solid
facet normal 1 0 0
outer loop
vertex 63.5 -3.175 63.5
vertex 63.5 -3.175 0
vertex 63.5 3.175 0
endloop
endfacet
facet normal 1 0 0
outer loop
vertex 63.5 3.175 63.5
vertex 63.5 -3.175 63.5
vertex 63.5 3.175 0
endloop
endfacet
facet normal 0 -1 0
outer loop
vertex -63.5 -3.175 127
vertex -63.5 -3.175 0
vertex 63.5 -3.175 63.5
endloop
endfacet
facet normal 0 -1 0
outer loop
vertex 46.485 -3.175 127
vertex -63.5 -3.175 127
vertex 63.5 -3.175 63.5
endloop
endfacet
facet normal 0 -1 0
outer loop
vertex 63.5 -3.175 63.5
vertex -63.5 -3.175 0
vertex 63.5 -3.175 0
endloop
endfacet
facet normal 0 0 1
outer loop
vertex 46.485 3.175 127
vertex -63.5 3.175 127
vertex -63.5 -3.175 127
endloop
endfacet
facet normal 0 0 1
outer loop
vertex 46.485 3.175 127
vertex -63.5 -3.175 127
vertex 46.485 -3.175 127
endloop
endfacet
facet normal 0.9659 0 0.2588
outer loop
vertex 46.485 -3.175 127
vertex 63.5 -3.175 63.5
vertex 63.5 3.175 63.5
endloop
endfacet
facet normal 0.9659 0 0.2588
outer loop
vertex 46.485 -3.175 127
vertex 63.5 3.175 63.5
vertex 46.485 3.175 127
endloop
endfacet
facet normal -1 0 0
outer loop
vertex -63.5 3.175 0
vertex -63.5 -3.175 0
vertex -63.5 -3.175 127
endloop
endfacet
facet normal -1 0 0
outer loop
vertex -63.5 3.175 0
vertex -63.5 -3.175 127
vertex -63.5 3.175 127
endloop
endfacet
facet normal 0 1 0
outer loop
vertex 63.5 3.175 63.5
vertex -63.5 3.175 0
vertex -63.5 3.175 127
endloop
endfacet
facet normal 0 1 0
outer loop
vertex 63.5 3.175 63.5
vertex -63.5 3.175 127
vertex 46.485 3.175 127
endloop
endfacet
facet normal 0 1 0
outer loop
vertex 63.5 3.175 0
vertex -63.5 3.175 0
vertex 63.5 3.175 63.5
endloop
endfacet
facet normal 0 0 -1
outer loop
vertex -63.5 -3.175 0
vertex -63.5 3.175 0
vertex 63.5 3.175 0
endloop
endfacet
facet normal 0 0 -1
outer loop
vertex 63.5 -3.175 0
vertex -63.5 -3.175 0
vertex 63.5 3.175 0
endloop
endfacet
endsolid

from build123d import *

# Parameters (mm, degrees)
SKETCH1_W               = 127
SKETCH1_H               = 6.35
BOSS_EXTRUDE1_DEPTH     = 127
CUT_EXTRUDE1_DEPTH      = 1
CUT_EXTRUDE1_DEPTH_BACK = 7.35


with BuildPart() as part:
    # Sketch1 → Boss-Extrude1 (new body)
    with BuildSketch(Plane.XY):
        Rectangle(SKETCH1_W, SKETCH1_H)
    extrude(amount=BOSS_EXTRUDE1_DEPTH)

    # Sketch2 → Cut-Extrude1 (cut, two sides)
    with BuildSketch(Plane.XZ.offset(3.175)) as cut_extrude1_sk:
        Polygon((63.5, 63.5), (46.485226281, 127), (63.5, 127), align=None)
    extrude(amount=CUT_EXTRUDE1_DEPTH, mode=Mode.SUBTRACT)
    extrude(cut_extrude1_sk.sketch, amount=-CUT_EXTRUDE1_DEPTH_BACK, mode=Mode.SUBTRACT)


solid = part.part
